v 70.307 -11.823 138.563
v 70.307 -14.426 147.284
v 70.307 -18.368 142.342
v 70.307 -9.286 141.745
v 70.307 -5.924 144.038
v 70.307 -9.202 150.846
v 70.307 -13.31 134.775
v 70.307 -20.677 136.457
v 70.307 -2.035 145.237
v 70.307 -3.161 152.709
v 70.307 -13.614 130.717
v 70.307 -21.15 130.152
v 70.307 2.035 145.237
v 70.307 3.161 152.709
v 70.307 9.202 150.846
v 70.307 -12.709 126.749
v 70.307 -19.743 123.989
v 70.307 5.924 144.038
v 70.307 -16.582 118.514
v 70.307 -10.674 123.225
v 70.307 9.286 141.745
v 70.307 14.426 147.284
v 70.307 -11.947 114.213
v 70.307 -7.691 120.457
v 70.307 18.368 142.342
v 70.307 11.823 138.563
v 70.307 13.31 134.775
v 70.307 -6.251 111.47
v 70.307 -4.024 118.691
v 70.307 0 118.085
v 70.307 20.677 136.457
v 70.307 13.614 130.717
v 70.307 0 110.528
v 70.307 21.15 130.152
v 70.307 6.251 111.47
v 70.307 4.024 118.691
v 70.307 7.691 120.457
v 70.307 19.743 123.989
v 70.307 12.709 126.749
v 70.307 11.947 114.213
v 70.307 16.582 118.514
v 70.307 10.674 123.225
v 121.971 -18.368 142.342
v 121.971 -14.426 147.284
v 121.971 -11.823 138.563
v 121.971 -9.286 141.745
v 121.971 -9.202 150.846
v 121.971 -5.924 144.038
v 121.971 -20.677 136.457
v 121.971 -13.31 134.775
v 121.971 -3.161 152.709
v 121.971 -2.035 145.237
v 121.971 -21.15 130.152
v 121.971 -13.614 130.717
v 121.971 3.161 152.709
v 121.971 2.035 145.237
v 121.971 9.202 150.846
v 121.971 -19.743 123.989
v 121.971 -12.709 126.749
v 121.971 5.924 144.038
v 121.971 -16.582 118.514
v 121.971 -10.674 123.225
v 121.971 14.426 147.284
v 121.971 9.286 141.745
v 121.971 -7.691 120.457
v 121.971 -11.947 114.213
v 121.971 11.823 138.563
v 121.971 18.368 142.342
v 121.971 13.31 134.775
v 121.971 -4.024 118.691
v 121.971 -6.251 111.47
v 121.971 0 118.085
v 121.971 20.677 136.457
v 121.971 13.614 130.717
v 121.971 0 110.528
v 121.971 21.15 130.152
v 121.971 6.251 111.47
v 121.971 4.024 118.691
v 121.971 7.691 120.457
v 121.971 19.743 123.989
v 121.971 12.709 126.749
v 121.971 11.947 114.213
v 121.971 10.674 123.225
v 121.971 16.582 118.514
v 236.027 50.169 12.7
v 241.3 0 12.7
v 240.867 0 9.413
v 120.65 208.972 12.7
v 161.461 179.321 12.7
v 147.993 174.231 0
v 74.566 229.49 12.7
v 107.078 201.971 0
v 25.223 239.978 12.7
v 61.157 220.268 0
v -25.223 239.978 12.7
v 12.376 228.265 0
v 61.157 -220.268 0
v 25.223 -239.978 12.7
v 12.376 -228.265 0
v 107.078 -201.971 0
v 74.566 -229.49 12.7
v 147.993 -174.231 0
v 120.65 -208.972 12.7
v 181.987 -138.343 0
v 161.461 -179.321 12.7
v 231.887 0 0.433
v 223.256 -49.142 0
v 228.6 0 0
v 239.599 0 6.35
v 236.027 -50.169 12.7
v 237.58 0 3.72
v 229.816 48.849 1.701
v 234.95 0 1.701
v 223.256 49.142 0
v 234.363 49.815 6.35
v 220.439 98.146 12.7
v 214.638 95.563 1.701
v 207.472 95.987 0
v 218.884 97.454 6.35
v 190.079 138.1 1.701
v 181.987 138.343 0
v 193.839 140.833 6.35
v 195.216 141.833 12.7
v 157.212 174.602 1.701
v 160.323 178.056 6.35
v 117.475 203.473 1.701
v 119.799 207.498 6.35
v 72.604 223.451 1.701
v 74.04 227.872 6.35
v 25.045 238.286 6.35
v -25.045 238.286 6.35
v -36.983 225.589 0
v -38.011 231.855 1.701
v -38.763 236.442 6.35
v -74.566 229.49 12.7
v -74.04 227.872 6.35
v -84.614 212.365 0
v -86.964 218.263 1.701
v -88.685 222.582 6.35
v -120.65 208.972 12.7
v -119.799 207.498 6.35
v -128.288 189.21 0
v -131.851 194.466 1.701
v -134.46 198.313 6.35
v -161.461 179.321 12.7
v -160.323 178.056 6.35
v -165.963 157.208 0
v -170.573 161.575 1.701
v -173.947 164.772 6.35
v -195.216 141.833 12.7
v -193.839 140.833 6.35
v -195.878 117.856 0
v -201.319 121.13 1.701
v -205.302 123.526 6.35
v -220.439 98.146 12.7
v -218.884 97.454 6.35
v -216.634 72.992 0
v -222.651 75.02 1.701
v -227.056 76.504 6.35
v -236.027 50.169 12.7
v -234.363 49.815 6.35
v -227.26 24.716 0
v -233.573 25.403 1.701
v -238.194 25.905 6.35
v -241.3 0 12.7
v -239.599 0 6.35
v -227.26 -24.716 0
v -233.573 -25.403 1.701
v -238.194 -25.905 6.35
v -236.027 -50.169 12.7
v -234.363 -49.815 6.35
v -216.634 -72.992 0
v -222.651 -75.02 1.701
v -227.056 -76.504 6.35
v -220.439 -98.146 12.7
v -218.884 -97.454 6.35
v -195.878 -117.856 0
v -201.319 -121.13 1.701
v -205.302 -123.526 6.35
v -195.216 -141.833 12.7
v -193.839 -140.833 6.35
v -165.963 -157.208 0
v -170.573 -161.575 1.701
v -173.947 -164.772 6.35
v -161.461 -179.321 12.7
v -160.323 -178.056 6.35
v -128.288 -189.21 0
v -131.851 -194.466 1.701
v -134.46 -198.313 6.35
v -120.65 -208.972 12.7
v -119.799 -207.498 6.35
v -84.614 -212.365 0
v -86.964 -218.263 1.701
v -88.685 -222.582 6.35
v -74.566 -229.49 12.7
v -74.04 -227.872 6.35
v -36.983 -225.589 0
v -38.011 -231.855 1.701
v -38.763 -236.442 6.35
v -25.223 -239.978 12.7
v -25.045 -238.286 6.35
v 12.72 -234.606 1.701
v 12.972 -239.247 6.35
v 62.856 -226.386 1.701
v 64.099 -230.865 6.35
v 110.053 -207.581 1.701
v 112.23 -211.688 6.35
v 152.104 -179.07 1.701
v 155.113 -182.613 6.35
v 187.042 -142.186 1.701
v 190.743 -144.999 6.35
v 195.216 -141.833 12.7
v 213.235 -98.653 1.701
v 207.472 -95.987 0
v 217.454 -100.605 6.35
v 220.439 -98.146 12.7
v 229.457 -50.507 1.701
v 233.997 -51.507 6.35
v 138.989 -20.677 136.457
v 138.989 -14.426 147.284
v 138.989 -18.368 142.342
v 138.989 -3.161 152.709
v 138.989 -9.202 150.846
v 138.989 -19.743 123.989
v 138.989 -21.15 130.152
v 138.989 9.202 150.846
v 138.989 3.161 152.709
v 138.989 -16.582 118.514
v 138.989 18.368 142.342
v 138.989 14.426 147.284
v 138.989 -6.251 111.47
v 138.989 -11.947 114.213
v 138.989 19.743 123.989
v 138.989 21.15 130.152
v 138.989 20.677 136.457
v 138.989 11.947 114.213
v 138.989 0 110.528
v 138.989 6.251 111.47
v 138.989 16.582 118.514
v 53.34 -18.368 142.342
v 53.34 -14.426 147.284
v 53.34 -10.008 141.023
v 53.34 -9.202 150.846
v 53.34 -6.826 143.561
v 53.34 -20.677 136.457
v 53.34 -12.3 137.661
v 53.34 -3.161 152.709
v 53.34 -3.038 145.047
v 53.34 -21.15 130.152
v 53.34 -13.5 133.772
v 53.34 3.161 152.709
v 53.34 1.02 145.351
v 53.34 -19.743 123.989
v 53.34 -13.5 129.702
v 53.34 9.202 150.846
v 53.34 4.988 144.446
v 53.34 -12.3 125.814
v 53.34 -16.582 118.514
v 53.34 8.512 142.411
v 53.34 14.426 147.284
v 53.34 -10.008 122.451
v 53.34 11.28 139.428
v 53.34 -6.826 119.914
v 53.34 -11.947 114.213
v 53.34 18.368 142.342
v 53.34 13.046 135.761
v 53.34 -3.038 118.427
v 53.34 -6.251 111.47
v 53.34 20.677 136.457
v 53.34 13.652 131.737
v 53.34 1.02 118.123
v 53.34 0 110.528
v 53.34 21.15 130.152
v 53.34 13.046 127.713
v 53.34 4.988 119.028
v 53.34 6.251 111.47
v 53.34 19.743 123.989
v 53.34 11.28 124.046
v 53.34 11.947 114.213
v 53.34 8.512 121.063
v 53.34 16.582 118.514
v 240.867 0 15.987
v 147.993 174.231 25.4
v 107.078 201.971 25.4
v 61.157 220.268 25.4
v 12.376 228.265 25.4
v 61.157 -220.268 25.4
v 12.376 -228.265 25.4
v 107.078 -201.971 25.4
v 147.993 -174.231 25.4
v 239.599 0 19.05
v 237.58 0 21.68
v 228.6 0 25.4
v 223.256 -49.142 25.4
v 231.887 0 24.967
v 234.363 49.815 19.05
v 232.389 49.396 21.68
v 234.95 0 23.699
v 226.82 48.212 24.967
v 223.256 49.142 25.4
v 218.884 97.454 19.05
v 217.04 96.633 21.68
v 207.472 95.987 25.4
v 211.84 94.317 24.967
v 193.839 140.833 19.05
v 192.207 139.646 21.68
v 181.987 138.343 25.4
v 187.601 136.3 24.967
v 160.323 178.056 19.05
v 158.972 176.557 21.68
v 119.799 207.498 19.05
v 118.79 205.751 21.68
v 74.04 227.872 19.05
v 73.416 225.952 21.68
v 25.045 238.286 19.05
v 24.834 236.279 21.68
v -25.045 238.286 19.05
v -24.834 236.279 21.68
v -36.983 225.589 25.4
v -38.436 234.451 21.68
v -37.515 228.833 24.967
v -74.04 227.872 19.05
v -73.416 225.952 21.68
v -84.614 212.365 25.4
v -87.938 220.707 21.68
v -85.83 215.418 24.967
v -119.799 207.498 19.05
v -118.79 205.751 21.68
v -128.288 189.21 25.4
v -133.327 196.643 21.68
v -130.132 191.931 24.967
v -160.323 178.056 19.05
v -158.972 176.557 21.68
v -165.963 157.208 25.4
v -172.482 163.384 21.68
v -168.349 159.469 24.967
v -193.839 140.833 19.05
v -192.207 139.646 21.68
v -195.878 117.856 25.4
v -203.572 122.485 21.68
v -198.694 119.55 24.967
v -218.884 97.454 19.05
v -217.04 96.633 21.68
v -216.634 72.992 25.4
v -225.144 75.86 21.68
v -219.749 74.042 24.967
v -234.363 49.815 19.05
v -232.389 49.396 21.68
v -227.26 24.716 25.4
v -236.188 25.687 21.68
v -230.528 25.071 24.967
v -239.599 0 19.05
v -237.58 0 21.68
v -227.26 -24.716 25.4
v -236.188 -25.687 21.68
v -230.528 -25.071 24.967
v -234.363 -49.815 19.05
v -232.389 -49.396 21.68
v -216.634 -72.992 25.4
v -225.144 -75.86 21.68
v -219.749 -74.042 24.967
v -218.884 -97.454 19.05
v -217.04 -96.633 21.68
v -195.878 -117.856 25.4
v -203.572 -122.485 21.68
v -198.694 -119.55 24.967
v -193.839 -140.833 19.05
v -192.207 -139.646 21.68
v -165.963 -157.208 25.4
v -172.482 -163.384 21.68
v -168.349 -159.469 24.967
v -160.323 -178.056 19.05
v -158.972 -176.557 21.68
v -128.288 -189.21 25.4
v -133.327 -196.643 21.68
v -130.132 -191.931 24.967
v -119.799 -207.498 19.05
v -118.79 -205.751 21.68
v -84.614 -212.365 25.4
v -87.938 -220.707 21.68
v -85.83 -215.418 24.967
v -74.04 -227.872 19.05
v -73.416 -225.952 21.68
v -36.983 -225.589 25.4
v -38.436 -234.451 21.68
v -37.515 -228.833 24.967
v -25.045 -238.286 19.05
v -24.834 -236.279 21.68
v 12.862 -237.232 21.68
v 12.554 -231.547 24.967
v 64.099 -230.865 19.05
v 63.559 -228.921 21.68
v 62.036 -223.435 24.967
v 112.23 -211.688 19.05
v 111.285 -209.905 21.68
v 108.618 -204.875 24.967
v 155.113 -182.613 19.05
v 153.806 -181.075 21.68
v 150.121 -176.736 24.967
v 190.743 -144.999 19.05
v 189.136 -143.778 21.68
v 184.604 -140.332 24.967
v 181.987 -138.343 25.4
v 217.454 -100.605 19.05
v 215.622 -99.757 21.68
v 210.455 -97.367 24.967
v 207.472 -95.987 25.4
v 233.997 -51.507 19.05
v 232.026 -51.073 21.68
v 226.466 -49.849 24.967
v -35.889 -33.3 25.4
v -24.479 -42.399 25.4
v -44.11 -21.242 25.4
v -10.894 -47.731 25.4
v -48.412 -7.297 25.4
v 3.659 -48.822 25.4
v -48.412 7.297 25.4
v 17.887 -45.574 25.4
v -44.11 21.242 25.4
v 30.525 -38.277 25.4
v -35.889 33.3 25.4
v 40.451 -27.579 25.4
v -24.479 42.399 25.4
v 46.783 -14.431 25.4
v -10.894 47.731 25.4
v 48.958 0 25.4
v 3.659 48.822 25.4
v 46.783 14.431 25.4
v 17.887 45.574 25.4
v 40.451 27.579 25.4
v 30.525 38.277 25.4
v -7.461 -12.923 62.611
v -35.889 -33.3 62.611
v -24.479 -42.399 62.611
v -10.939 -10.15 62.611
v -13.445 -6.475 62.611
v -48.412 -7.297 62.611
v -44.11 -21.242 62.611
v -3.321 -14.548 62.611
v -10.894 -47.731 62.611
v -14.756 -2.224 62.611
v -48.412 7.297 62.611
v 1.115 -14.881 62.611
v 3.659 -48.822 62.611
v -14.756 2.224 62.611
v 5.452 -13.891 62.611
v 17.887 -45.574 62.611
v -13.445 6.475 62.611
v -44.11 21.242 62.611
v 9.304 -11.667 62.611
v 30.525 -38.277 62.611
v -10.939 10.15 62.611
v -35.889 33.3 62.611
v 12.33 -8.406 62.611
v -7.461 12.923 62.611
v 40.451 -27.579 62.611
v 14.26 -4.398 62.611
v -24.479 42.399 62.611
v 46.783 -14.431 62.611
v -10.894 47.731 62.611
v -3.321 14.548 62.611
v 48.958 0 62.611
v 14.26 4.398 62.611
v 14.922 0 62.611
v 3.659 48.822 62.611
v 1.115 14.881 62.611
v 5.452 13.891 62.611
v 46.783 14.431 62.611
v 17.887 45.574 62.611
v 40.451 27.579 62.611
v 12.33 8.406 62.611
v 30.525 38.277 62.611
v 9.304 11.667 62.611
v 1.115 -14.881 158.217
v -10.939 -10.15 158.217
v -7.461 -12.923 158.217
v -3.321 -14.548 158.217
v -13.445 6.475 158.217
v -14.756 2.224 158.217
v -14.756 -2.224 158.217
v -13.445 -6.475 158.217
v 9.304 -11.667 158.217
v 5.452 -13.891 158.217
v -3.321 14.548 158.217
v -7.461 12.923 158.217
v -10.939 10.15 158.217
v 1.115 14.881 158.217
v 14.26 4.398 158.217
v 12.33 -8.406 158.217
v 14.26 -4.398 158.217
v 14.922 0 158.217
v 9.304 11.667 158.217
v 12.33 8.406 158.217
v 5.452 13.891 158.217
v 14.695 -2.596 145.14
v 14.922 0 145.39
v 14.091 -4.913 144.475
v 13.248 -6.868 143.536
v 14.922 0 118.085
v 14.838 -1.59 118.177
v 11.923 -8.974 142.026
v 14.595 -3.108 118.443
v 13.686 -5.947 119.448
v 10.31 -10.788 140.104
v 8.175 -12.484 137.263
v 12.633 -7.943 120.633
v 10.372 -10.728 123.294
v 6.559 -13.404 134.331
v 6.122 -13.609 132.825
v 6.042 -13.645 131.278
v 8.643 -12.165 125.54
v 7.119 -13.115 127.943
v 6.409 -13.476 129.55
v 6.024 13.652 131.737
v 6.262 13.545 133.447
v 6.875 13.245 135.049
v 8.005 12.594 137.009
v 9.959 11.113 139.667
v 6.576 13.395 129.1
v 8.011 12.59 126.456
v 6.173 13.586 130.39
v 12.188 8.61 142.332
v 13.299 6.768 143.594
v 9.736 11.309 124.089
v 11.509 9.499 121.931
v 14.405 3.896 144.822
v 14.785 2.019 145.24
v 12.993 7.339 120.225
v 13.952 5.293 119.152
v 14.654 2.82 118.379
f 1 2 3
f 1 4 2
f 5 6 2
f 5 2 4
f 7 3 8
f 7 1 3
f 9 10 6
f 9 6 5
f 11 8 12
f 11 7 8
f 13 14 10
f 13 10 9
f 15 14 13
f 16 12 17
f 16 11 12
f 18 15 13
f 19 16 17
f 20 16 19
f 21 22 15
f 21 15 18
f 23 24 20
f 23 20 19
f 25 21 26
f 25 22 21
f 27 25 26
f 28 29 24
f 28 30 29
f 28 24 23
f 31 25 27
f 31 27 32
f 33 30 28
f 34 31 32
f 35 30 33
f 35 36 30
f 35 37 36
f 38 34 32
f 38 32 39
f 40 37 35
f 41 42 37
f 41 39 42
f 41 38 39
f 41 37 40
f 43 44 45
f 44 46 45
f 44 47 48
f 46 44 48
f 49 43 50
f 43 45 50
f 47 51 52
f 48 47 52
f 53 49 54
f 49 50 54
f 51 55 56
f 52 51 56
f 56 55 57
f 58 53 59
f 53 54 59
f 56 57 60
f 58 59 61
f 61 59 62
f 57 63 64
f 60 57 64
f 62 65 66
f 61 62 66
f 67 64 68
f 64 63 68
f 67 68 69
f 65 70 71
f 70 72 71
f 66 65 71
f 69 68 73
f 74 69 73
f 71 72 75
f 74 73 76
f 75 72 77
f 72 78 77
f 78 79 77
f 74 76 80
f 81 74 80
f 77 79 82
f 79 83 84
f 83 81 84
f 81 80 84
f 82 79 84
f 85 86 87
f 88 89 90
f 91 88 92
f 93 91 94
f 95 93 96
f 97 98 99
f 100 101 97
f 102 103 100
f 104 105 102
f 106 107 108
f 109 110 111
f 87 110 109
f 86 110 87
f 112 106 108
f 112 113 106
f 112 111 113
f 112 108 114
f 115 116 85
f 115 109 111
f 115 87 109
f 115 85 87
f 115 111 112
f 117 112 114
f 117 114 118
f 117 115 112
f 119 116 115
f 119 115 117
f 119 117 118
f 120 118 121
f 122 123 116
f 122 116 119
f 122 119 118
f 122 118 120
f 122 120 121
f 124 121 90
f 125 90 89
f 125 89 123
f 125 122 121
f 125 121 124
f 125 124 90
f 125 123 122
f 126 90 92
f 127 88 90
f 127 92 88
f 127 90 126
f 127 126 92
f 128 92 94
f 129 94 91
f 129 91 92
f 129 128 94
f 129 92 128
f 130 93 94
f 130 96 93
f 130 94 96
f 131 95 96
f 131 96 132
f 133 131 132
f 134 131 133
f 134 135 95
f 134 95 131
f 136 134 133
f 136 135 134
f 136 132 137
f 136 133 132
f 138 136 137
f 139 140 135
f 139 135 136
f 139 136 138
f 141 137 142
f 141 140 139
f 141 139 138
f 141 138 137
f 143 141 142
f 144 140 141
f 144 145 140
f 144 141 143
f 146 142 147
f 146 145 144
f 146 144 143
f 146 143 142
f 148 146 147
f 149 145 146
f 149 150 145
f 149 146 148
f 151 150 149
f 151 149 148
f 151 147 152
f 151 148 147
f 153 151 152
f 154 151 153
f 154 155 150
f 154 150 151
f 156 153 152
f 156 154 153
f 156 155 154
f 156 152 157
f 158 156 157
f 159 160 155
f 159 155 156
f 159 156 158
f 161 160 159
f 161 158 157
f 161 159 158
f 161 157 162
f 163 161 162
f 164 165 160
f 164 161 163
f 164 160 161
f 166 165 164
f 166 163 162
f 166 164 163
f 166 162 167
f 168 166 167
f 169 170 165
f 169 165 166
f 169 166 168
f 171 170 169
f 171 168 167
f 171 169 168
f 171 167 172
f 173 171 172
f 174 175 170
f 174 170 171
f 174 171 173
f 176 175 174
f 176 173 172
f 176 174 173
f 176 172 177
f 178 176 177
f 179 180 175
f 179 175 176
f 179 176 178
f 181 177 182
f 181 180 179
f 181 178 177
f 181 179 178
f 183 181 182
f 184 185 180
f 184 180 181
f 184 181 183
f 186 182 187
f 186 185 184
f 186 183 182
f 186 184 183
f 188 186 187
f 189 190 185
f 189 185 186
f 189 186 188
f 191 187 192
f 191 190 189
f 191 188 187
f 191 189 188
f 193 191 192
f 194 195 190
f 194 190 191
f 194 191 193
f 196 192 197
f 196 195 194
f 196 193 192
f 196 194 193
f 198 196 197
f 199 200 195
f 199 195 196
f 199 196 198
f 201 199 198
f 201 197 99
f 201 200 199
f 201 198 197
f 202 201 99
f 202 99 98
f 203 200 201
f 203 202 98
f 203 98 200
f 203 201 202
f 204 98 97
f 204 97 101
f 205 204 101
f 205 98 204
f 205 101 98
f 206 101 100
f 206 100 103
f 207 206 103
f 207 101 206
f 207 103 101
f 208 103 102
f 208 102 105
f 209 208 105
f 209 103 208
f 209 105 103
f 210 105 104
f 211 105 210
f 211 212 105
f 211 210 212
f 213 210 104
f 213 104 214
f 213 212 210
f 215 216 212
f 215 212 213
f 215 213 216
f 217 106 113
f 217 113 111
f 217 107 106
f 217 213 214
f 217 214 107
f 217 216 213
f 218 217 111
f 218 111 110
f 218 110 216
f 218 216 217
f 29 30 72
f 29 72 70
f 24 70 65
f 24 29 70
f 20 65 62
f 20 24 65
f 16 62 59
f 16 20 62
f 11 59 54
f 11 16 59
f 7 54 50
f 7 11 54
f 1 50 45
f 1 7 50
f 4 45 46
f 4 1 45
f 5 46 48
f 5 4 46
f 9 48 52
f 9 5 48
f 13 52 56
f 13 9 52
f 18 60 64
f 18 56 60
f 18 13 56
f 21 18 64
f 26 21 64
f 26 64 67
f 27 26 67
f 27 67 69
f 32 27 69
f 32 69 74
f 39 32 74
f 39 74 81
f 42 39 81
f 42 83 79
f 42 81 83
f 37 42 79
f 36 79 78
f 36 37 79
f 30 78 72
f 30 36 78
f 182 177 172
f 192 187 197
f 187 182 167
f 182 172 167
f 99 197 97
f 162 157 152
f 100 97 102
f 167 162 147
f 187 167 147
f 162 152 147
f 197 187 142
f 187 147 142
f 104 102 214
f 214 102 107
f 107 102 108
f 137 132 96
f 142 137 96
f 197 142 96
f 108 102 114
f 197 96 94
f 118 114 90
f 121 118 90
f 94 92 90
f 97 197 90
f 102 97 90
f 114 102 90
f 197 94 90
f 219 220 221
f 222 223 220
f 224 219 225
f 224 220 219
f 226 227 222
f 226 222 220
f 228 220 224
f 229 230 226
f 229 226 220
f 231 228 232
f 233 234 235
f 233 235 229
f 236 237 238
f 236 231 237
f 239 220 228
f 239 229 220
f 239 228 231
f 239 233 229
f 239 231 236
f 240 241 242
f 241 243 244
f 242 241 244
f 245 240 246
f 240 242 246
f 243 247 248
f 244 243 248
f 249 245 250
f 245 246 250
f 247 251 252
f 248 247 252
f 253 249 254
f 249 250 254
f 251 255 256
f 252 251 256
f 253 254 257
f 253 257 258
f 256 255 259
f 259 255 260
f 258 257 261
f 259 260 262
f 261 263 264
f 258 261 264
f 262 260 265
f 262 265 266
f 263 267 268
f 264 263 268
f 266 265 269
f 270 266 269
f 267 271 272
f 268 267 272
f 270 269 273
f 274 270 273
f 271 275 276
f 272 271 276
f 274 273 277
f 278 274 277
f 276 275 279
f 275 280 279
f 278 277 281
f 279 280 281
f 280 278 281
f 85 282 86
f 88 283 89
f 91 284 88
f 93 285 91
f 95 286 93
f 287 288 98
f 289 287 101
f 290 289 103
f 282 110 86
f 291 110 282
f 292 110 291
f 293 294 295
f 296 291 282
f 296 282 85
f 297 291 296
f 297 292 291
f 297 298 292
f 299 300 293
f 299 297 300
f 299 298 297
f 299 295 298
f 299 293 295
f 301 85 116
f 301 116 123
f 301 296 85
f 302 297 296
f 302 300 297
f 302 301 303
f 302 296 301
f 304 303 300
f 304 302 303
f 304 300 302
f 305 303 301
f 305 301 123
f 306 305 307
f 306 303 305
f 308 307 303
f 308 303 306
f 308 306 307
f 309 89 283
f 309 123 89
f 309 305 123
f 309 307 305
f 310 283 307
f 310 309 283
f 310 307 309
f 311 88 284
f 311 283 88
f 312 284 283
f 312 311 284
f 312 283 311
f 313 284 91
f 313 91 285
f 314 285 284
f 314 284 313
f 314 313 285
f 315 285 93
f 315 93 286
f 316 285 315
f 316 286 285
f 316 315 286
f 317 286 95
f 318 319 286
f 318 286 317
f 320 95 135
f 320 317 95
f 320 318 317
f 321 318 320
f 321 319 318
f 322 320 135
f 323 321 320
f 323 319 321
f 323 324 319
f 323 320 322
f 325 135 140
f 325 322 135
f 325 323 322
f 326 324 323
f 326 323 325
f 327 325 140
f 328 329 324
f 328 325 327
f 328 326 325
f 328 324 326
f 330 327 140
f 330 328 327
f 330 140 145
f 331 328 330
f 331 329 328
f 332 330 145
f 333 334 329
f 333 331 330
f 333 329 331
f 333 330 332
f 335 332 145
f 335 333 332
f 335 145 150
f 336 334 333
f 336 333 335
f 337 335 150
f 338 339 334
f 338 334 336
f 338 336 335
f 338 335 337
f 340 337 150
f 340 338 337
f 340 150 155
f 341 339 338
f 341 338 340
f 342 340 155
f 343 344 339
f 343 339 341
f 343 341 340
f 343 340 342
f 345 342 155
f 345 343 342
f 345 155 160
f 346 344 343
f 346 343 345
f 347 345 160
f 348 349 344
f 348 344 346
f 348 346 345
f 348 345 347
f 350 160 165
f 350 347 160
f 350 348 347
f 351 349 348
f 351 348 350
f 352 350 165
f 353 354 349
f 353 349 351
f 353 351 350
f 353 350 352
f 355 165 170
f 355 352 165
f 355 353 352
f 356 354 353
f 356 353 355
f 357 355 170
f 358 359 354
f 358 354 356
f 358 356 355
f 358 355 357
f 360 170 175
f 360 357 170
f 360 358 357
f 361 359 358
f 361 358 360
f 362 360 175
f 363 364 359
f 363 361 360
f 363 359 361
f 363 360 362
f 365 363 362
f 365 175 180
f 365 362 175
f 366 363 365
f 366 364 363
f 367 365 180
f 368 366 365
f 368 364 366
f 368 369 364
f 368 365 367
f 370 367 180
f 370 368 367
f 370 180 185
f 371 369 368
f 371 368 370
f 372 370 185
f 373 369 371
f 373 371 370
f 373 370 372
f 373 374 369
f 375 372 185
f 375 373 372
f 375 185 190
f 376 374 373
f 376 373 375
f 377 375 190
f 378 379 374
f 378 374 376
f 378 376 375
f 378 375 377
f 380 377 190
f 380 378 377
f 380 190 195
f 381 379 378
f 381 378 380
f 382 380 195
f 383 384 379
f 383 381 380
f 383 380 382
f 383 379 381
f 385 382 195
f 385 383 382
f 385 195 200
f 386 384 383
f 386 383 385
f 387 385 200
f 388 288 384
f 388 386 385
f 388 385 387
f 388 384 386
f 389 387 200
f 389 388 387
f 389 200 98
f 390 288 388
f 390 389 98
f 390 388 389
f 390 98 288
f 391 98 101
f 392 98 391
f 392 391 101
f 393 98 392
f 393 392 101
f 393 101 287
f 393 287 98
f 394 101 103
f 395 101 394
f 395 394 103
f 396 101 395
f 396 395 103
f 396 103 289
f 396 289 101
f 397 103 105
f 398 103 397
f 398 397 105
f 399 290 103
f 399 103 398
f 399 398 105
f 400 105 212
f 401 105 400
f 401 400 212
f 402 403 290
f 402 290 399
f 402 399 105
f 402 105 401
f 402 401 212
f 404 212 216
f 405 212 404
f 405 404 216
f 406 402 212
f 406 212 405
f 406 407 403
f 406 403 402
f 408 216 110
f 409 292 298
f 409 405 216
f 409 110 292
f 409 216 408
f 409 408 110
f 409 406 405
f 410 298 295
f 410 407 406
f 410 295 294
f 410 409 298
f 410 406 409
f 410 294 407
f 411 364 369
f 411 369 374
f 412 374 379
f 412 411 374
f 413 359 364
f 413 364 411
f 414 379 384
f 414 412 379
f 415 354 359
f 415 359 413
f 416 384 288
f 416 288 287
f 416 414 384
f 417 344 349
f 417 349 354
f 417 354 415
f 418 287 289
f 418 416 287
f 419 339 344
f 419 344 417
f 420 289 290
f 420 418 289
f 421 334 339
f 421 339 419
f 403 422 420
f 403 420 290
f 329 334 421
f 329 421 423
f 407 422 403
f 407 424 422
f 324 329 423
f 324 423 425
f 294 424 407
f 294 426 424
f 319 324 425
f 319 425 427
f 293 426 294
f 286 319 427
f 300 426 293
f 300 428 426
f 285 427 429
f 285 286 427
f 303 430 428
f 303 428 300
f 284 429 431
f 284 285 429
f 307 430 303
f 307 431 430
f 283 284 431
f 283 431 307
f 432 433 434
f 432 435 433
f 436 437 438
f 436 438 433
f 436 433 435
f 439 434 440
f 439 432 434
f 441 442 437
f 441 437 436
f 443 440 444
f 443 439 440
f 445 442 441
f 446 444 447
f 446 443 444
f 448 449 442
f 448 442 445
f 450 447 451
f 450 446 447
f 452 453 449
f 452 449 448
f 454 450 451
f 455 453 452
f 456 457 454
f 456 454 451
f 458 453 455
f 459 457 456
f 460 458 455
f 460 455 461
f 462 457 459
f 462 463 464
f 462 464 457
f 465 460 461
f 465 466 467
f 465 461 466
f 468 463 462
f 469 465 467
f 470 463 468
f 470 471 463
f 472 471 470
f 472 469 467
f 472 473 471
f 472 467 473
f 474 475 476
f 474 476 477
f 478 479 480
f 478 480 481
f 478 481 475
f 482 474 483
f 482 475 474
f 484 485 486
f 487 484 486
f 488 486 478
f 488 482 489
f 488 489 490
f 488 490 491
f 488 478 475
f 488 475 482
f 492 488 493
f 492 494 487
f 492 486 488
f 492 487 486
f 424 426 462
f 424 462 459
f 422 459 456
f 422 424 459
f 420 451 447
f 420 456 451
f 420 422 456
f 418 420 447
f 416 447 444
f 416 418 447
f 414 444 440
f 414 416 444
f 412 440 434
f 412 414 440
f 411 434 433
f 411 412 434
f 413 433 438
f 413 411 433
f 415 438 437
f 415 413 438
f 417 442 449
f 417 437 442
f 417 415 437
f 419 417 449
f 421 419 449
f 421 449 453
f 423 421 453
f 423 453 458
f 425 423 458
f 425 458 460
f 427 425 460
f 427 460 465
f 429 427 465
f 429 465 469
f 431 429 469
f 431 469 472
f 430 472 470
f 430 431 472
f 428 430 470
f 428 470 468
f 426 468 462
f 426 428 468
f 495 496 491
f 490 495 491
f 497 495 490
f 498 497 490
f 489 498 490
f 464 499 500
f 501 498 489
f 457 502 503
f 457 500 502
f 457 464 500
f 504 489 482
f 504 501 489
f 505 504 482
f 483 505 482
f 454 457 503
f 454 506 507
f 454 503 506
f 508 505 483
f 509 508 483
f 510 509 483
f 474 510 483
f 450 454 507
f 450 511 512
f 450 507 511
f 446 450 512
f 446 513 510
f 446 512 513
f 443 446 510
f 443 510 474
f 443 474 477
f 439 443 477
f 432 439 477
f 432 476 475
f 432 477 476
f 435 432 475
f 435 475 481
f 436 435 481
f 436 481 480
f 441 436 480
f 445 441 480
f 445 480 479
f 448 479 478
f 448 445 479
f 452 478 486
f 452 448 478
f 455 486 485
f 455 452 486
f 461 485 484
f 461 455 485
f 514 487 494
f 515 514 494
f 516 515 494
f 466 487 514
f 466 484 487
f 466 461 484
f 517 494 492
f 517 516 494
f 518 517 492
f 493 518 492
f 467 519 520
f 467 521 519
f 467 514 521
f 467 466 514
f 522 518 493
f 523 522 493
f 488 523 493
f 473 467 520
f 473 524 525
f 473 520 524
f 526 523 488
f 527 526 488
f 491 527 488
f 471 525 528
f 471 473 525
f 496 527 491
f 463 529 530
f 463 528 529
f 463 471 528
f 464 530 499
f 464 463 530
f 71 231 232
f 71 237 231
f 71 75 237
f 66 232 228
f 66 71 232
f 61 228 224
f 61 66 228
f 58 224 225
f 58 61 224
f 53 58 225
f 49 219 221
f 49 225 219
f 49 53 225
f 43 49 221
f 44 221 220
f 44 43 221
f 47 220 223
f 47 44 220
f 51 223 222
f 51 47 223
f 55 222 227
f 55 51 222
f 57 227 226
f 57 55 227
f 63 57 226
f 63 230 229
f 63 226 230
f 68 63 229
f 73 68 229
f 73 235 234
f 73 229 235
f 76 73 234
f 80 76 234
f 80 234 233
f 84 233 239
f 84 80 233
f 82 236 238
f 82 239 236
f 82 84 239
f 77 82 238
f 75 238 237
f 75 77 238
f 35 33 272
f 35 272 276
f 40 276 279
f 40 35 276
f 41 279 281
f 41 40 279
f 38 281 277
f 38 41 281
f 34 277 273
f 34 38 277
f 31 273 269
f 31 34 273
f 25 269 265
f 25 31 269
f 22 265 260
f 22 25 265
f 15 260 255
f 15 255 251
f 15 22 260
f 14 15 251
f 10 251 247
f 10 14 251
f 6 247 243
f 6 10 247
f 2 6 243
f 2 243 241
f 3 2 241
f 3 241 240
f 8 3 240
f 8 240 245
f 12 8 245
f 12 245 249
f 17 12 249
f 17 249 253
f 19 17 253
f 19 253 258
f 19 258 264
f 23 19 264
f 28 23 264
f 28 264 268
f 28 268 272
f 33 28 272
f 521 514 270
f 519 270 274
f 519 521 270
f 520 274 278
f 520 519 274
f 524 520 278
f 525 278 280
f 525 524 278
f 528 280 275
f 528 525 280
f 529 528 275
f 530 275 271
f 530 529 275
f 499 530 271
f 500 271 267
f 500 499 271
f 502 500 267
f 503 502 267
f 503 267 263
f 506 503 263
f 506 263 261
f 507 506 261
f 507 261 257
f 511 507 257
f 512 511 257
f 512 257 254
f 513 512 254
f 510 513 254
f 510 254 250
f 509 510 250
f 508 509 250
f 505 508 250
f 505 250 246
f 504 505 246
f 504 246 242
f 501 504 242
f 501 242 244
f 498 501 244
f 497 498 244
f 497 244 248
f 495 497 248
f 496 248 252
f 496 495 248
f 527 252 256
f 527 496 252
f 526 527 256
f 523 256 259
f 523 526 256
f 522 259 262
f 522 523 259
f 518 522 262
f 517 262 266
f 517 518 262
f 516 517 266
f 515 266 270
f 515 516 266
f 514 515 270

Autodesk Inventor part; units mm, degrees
ref_plane "YZ Plane" through (0, 0, 0) normal (1, 0, 0) x (0, 1, 0)
ref_plane "XZ Plane" through (0, 0, 0) normal (0, 1, 0) x (-1, 0, 0)
ref_plane "XY Plane" through (0, 0, 0) normal (0, 0, 1) x (1, 0, 0)
sketch "Sketch1" plane through (0, 0, 0) normal (0, 0, 1) x (1, 0, 0)
  circle A0 centre (0, 0) radius 203.2
  circle A1 centre (0, 0) radius 241.3
  dimension "d0" = 406.4
  dimension "d1" = 38.1
extrude "Extrusion1" add sketch "Sketch1" along normal blind 25.4 contours A0 | A1
fillet "Fillet1" radius 12.7 2 edges at (-241.3, 0, 25.4) (-241.3, 0, 0)
sketch "Sketch2" plane through (0, 0, 25.4) normal (0, 0, 1) x (1, 0, 0)
  circle A0 centre (0, 0) radius 48.9585
  dimension "d5" = 97.917
extrude "Extrusion2" add sketch "Sketch2" along normal blind 37.211
sketch "Sketch3" plane through (0, 0, 62.611) normal (0, 0, 1) x (1, 0, 0)
  circle A0 centre (0, 0) radius 14.9225
  dimension "d8" = 29.845
extrude "Extrusion3" add sketch "Sketch3" along normal blind 95.6056
sketch "Sketch5" plane through (0, 0, 0) normal (1, 0, 0) x (0, 1, 0)
  circle A0 centre (0, 131.7371) radius 13.6525
  line L0 (14.9225, 158.2166) -> (-14.9225, 158.2166) projected
  point P0 (0, 0)
  dimension "d11" = 27.305
  dimension "d12" = 26.4795
extrude "Extrusion4" add sketch "Sketch5" along normal blind 133.8072
sketch "Sketch6" plane through (133.8072, 0, 131.7371) normal (1, 0, 0) x (0, 0, -1)
  circle A0 centre (0, 0) radius 13.6525 projected
  circle A1 centre (0, 0) radius 21.209
  point P0 (131.7371, 0)
  dimension "d15" = 42.418
extrude "Extrusion5" add sketch "Sketch6" against normal blind 80.4672
sketch "Sketch8" plane through (133.8072, 0, 131.7371) normal (1, 0, 0) x (0, 0, -1)
  circle A0 centre (0, 0) radius 21.209
  point P0 (131.7371, 0)
extrude "Extrusion6" cut sketch "Sketch8" against normal blind 63.5
sketch "Sketch9" plane through (70.3072, 0, 131.7371) normal (1, 0, 0) x (0, 0, -1)
  circle A0 centre (0, 0) radius 13.6525 projected
  circle A1 centre (0, 0) radius 13.6525
  point P0 (131.7371, 0)
extrude "Extrusion7" add sketch "Sketch9" along normal blind 51.6636
sketch "Sketch10" plane through (121.9708, 0, 131.7371) normal (1, 0, 0) x (0, 0, -1)
  circle A0 centre (0, 0) radius 21.209
  point P0 (131.7371, 0)
extrude "Extrusion8" add sketch "Sketch10" along normal blind 17.018
properties part number "pizza wheel"
